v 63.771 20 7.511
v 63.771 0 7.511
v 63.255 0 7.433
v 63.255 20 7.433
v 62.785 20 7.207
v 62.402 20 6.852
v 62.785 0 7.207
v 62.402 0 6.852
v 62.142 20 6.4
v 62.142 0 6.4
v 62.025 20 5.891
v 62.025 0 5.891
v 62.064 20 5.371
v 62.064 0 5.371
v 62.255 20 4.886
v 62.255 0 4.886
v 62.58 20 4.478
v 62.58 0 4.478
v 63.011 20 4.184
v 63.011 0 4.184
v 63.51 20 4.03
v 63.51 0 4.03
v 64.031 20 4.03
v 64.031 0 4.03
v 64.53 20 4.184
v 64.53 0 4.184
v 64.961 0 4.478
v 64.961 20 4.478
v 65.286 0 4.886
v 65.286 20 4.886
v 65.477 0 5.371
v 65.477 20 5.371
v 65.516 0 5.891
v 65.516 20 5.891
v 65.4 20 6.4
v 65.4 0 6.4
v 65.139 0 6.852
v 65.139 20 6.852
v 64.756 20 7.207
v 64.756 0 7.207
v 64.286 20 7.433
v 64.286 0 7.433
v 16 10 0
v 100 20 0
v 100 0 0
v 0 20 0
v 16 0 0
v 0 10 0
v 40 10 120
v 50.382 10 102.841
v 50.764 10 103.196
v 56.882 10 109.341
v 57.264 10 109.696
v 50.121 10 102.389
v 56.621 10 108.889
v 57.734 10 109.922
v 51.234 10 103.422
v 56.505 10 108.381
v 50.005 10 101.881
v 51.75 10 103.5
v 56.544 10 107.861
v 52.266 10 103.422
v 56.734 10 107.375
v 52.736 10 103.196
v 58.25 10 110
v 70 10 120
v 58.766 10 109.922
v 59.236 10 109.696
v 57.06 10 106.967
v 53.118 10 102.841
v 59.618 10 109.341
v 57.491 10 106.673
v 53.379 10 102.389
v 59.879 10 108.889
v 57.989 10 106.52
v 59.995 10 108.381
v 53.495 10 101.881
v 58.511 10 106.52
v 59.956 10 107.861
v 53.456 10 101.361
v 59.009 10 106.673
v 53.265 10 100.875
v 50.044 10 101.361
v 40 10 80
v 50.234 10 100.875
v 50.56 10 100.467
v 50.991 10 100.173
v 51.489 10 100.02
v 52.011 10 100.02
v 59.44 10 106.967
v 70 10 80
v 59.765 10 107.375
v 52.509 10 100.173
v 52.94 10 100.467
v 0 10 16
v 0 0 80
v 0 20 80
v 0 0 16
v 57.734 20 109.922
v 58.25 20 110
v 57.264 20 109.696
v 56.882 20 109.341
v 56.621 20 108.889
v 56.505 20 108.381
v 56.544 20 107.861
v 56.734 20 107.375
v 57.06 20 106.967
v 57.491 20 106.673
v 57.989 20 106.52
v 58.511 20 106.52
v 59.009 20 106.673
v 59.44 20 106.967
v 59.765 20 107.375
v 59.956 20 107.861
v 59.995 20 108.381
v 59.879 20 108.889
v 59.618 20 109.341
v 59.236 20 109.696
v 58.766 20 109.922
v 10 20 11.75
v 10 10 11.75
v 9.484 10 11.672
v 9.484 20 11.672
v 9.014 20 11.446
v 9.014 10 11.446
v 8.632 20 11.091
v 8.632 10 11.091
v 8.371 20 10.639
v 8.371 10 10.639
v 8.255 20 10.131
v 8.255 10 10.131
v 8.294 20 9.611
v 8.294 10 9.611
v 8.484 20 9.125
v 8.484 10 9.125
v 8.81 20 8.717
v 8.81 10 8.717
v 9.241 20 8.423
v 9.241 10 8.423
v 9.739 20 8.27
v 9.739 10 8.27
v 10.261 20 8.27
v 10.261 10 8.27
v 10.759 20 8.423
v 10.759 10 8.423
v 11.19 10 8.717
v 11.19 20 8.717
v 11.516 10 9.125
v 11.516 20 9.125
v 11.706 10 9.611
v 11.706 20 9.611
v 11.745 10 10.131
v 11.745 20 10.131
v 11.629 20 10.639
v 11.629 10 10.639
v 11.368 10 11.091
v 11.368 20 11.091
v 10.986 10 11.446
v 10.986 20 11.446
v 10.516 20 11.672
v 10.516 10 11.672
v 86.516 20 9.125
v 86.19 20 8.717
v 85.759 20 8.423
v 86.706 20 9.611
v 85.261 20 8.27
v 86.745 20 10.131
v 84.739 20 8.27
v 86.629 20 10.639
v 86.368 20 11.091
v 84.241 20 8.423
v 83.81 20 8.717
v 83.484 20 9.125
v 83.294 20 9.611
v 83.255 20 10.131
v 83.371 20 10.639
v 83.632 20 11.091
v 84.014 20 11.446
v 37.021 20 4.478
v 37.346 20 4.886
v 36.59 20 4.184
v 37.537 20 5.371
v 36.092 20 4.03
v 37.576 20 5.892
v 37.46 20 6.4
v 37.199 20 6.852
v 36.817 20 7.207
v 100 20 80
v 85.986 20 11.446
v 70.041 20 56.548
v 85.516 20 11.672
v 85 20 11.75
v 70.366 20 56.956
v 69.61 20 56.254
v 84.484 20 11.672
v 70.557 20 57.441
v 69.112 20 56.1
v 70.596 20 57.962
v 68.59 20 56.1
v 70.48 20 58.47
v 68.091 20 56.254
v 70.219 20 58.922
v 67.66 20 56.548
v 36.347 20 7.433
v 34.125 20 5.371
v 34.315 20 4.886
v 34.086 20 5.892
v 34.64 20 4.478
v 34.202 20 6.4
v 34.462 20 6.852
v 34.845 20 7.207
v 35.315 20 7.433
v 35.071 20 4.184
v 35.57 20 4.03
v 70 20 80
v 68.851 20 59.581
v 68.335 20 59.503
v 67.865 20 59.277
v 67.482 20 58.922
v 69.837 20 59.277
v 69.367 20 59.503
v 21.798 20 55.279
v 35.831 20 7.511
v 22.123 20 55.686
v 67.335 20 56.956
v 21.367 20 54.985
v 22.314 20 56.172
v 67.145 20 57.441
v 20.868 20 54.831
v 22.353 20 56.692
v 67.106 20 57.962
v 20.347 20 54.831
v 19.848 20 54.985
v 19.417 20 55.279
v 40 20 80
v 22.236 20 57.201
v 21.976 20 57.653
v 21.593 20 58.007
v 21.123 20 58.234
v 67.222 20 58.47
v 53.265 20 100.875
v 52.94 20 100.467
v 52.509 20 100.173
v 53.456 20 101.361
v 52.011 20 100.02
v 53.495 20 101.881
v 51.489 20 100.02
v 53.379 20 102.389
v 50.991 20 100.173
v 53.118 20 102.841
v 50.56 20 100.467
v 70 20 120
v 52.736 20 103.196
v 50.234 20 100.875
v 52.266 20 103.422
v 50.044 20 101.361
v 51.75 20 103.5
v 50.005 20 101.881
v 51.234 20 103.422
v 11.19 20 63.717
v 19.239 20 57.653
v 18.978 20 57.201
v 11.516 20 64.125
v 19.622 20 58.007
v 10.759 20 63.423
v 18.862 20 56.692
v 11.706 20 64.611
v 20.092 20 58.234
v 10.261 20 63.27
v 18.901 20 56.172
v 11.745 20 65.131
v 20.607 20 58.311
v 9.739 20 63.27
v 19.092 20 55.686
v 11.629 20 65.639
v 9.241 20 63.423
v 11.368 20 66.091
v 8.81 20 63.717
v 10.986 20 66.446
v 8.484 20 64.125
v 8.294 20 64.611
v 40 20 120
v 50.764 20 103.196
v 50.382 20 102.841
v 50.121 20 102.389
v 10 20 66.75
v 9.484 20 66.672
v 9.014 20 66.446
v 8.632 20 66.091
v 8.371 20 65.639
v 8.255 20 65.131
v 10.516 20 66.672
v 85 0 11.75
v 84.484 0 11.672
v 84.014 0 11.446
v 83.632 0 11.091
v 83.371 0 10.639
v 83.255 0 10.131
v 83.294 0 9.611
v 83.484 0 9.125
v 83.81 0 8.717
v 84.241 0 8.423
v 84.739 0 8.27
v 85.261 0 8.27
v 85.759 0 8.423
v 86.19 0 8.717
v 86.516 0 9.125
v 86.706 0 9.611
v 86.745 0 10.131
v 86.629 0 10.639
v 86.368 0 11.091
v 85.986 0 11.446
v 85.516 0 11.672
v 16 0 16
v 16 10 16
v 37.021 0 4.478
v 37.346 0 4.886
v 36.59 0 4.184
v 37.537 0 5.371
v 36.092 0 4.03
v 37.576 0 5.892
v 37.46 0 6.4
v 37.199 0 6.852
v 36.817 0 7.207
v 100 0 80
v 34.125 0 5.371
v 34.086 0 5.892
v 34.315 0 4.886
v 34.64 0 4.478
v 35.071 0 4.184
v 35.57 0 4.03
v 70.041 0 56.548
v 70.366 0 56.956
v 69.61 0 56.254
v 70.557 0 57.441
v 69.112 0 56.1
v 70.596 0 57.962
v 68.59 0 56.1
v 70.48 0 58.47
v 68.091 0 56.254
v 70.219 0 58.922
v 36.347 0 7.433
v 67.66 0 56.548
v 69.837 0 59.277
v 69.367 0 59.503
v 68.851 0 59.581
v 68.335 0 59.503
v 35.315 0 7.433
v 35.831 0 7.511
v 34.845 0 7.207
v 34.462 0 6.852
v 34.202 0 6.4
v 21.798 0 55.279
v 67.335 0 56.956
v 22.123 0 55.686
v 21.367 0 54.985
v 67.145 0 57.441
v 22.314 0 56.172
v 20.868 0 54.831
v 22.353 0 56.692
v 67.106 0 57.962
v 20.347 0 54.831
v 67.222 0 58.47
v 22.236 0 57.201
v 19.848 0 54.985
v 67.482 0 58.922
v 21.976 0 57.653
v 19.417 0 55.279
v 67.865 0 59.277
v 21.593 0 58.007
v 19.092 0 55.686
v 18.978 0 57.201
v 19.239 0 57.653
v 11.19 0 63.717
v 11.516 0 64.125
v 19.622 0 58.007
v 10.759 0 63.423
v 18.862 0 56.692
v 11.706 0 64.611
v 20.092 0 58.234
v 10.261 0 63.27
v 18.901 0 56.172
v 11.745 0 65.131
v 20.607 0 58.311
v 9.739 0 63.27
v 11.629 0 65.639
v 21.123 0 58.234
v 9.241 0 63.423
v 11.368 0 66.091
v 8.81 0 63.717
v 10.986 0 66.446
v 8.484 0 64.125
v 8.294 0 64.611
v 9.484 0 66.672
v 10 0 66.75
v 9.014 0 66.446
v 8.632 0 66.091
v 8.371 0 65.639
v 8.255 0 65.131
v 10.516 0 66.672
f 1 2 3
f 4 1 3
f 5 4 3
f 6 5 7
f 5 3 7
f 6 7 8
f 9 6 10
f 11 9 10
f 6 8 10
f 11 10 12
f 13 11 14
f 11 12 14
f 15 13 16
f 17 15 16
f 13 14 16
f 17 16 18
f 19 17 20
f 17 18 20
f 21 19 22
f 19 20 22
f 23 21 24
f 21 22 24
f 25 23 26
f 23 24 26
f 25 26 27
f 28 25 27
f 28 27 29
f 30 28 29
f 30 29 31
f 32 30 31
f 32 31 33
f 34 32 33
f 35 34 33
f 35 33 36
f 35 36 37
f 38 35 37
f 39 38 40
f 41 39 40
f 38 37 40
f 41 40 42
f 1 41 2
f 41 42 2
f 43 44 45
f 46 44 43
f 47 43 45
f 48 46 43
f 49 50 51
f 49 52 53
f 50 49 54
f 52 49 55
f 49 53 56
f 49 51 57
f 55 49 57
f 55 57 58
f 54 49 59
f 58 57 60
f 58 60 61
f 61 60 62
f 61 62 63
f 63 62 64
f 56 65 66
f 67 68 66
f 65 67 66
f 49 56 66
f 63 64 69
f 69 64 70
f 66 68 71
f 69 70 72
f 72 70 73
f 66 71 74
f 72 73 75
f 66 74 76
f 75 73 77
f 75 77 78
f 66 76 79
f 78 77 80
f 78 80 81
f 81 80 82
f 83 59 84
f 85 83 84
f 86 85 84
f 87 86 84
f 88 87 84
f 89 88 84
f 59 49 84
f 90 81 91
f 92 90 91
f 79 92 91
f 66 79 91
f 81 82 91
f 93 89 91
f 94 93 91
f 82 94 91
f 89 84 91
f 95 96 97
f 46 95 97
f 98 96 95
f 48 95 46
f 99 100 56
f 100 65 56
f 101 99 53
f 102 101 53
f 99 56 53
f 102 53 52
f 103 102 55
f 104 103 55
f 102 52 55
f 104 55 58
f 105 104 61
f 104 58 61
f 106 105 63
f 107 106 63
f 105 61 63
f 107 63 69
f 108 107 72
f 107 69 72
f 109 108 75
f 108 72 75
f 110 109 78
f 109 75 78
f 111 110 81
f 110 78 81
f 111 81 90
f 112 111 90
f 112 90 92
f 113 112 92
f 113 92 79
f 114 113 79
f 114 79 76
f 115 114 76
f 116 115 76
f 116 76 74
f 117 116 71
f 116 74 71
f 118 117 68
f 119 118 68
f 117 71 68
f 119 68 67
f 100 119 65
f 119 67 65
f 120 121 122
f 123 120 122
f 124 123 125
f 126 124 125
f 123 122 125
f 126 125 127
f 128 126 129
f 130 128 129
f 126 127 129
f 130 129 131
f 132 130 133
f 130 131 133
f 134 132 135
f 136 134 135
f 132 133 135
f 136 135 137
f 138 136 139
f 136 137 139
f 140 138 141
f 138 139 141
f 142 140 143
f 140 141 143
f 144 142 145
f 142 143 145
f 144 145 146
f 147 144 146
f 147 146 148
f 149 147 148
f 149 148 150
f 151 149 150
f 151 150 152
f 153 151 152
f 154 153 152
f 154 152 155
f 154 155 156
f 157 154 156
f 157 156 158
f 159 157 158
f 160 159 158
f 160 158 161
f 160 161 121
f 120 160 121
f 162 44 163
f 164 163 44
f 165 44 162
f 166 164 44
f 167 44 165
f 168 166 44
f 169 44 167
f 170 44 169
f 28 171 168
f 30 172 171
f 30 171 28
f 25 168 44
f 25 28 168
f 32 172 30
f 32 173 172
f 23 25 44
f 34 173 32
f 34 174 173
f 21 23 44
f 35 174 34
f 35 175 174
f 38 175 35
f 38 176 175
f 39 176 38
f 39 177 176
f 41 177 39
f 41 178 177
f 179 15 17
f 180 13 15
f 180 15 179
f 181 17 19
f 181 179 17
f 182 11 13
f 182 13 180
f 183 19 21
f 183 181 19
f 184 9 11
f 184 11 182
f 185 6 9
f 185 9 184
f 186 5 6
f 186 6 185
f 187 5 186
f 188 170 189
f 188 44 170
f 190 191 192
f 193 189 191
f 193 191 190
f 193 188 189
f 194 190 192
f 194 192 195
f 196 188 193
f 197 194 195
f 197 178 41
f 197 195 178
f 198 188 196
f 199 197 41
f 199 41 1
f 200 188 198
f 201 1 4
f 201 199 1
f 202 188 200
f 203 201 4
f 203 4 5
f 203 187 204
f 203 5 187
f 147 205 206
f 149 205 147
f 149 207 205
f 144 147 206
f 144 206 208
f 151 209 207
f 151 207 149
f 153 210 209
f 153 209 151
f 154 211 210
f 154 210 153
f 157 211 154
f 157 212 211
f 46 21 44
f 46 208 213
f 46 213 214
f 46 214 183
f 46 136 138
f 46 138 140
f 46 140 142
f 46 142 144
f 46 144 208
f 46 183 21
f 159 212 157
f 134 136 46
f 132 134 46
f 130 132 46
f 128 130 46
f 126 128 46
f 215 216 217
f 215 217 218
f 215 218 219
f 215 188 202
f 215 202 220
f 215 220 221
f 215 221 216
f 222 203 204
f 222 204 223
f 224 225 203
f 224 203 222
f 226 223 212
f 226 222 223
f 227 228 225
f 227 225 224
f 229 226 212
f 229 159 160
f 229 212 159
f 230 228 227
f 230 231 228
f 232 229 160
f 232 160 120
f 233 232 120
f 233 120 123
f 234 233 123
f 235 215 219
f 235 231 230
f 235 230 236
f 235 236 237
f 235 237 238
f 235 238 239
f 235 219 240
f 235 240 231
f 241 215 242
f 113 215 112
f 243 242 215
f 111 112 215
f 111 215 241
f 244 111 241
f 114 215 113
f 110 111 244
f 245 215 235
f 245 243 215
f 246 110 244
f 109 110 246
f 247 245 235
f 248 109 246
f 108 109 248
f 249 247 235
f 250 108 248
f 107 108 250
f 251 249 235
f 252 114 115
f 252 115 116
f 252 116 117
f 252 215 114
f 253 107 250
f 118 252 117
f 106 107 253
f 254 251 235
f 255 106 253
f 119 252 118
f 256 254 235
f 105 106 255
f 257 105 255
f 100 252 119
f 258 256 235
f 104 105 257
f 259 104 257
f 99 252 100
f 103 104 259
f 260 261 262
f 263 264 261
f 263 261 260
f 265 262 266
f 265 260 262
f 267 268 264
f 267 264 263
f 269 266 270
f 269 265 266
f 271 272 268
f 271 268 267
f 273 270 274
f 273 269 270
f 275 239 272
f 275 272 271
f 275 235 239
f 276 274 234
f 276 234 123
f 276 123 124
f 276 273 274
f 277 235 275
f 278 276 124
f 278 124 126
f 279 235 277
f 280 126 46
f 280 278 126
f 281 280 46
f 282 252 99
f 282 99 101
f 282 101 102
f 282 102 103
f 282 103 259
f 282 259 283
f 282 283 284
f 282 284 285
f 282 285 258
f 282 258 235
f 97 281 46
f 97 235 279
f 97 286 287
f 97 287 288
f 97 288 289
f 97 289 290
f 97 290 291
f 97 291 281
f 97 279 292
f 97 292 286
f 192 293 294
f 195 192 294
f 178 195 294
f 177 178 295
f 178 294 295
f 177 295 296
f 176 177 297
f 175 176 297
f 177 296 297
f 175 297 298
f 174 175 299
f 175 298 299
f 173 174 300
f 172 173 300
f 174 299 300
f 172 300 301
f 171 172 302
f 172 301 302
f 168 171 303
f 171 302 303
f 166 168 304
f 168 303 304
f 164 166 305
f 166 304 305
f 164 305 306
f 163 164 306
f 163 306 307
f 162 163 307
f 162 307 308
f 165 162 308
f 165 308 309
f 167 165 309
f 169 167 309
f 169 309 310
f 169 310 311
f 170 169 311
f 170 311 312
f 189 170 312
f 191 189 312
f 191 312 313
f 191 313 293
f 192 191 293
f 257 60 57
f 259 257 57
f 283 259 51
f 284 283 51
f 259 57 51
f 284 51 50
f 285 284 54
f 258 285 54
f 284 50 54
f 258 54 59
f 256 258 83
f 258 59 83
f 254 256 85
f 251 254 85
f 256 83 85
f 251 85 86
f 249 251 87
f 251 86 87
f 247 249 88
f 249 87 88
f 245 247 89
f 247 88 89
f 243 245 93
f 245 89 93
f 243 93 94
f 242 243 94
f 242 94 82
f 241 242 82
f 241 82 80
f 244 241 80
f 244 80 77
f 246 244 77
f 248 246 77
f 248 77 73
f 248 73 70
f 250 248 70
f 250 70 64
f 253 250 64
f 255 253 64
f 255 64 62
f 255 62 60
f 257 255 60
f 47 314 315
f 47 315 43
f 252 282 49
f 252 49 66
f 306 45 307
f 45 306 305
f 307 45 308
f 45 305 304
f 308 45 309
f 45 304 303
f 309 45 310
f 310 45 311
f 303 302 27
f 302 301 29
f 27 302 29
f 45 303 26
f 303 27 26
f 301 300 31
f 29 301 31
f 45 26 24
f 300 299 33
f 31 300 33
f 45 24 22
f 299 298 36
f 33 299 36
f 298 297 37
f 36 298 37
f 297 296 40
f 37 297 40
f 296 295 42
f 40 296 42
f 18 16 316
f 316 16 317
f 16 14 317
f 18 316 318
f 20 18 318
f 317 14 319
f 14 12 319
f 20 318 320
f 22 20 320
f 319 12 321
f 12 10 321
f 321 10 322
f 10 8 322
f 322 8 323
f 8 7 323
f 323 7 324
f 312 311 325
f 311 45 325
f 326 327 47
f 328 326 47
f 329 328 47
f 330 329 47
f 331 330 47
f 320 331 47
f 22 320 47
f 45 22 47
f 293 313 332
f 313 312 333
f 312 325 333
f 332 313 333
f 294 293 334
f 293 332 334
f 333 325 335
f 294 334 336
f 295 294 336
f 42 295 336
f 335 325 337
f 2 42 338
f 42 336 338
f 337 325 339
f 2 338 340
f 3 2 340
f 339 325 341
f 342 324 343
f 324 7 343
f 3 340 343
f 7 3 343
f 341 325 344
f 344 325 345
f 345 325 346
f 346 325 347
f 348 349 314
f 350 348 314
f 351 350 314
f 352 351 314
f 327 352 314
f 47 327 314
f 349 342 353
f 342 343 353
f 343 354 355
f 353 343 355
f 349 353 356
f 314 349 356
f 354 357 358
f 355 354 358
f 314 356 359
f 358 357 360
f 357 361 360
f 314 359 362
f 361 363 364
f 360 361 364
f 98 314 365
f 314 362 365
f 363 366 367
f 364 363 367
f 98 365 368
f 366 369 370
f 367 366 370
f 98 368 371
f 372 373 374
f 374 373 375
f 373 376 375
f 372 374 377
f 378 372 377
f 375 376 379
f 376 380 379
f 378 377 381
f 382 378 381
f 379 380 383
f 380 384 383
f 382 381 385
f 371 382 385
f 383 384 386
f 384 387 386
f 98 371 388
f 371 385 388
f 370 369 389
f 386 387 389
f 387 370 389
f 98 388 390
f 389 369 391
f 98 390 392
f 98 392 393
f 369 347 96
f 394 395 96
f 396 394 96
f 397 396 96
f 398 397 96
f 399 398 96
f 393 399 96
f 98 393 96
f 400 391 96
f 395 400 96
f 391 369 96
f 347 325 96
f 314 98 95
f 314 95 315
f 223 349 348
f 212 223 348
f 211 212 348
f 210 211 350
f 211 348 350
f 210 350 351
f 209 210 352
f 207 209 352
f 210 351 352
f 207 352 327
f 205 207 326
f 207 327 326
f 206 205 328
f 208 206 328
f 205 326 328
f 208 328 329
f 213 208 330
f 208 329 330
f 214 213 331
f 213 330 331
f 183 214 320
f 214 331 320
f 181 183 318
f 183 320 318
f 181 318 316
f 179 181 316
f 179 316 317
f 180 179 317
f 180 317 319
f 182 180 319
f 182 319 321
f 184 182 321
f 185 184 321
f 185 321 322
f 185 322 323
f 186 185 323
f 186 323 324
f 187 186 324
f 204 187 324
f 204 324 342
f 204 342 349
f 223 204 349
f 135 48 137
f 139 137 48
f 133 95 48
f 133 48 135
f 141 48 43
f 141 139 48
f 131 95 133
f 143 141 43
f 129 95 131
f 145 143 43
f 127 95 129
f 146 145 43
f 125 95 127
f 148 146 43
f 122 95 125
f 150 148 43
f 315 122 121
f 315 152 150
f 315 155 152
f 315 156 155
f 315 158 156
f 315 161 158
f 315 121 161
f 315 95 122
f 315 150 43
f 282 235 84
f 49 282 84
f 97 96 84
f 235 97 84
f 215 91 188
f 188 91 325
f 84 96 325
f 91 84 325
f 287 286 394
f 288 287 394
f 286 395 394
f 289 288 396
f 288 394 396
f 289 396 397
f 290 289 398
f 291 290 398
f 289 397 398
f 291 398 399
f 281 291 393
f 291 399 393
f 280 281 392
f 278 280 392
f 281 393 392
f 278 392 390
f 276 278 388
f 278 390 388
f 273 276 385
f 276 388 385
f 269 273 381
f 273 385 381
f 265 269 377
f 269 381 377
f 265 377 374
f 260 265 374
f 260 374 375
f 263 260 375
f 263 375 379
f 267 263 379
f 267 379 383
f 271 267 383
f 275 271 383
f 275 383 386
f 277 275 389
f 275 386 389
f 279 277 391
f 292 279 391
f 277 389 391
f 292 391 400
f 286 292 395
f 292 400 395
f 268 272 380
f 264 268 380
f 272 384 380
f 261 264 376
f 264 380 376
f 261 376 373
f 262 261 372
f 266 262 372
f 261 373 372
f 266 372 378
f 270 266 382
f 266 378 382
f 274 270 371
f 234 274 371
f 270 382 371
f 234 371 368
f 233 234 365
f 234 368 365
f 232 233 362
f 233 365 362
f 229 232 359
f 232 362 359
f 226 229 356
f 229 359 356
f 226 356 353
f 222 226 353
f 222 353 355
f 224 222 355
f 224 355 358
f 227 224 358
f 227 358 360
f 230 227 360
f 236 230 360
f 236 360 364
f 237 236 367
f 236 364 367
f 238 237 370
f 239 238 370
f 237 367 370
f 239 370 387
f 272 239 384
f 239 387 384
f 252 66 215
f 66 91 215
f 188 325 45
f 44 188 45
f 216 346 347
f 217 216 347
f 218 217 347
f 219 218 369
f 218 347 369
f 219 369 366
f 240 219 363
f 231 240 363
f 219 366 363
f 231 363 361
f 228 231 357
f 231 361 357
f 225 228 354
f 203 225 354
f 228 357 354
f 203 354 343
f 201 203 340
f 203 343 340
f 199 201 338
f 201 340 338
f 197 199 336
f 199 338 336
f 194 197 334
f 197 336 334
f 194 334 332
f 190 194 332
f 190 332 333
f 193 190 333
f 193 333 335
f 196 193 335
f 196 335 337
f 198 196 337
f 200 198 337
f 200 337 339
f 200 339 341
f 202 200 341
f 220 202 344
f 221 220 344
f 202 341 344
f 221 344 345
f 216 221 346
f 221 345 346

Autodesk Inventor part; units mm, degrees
ref_plane "YZ Plane" through (0, 0, 0) normal (1, 0, 0) x (0, 1, 0)
ref_plane "XZ Plane" through (0, 0, 0) normal (0, 1, 0) x (-1, 0, 0)
ref_plane "XY Plane" through (0, 0, 0) normal (0, 0, 1) x (1, 0, 0)
sketch "Boceto1" plane through (0, 0, 0) normal (0, 1, 0) x (-1, 0, 0)
  line L0 (100, 80) -> (-100, 80)
  line L1 (-100, 80) -> (-100, -80)
  line L2 (-100, -80) -> (100, -80)
  line L3 (100, -80) -> (100, 80)
  line L4 (100, 80) -> (-100, -80) construction
  line L5 (-100, 80) -> (100, -80) construction
  point P0 (0, 0)
  dimension "d0" = 200
  dimension "d1" = 160
extrude "Extrusión1" add sketch "Boceto1" along normal blind 20
sketch "Boceto2" plane through (0, 20, 0) normal (0, 1, 0) x (1, 0, 0)
  line L0 (-100, 80) -> (-100, -80) projected
  line L1 (-100, 80) -> (-70, 80)
  line L2 (-70, 80) -> (-70, 40)
  line L3 (-70, 40) -> (-100, 40)
  line L4 (-100, 40) -> (-100, 80)
  line L5 (100, 80) -> (-100, 80) projected
  line L6 (0, 80) -> (0, 40)
  line L7 (100, 80) -> (70, 80)
  line L8 (70, 80) -> (70, 40)
  line L9 (70, 40) -> (100, 40)
  line L10 (100, 40) -> (100, 80)
  point P0 (0, 0)
  dimension "d4" = 30
  dimension "d5" = 40
extrude "Extrusión2" cut sketch "Boceto2" against normal blind 10
sketch "Boceto3" plane through (0, 20, 0) normal (0, 1, 0) x (1, 0, 0)
  line L0 (-70, 80) -> (-70, 40) projected
  line L1 (-70, 80.0001) -> (-70, 40)
  line L2 (-70, 40) -> (-100, 40) projected
  line L3 (-100, 40) -> (-100, 80.0001)
  line L4 (-100, 40) -> (-70, 40)
  line L5 (-70, 40) -> (-70, 80)
  line L6 (-70, 80) -> (-100, 80)
  line L7 (-100, 80) -> (-100, 40)
  circle A0 centre (-88.25, 58.25) radius 1.75
  circle A1 centre (-81.75, 51.75) radius 1.75
  line L8 (100, 80) -> (-100, 80) projected
  line L9 (0, 80) -> (0, 56.5)
  circle A2 centre (88.25, 58.25) radius 1.75
  circle A3 centre (81.75, 51.75) radius 1.75
  point P0 (0, 0)
  point P1 (-64.3507, 80)
  point P2 (-74.3507, 0)
  point P3 (-85, 80)
  dimension "d23" = 21.75
  dimension "d24" = 11.75
  dimension "d26" = 11.75
hole "Agujero1" at (-81.75, 20, -51.75) at (-88.25, 20, -58.25) at (81.75, 20, -51.75) at (88.25, 20, -58.25) direction (0, -1, 0) diameter 3.5 end through all
sketch "Boceto4" plane through (-100, 0, 80) normal (0, 0, 1) x (1, 0, 0)
  line L0 (30, 20) -> (60, 20)
  line L1 (60, 20) -> (60, 10)
  line L2 (60, 10) -> (30, 10)
  line L3 (30, 10) -> (30, 20)
  line L4 (0, 0) -> (0, 20) projected
  line L5 (100, 0) -> (100, 10)
  line L6 (170, 20) -> (140, 20)
  line L7 (140, 20) -> (140, 10)
  line L8 (140, 10) -> (170, 10)
  line L9 (170, 10) -> (170, 20)
  dimension "d34" = 30
  dimension "d35" = 10
  dimension "d36" = 30
extrude "Extrusión3" add sketch "Boceto4" along normal blind 40
sketch "Boceto5" plane through (0, 20, 0) normal (0, 1, 0) x (1, 0, 0)
  line L0 (59.9999, -50) -> (69.9999, -50)
  line L1 (49.9999, -101.75) -> (49.9999, -79.9497)
  line L2 (59.9999, -108.25) -> (59.9999, -50)
  line L3 (40, -80) -> (69.9999, -80)
  line L4 (49.9999, -79.9497) -> (40, -80)
  circle A0 centre (51.7499, -101.75) radius 1.75
  circle A1 centre (58.2499, -108.25) radius 1.75
  line L5 (69.9999, -80) -> (69.9999, -120)
  line L6 (40, -120) -> (40, -80)
  line L7 (69.9999, -120) -> (40, -120)
  line L8 (0, -50) -> (0, -71.75)
  line L9 (-40, -120) -> (-40, -80)
  line L10 (-49.9999, -101.75) -> (-49.9999, -79.9497)
  circle A2 centre (-51.7499, -101.75) radius 1.75
  circle A3 centre (-58.2499, -108.25) radius 1.75
  line L11 (-40, -80) -> (-69.9999, -80)
  line L12 (-69.9999, -120) -> (-40, -120)
  line L13 (-69.9999, -80) -> (-69.9999, -120)
  line L14 (-59.9999, -108.25) -> (-59.9999, -50)
  line L15 (-40, -120) -> (-69.9999, -120)
  line L16 (-69.9999, -80) -> (-69.9999, -120)
  line L17 (-40, -120) -> (-70, -120) projected
  line L18 (-40, -80) -> (-40, -120) projected
  line L19 (-59.9999, -110) -> (-49.9999, -110)
  line L20 (-49.9999, -110) -> (-49.9999, -100)
  line L21 (-49.9999, -100) -> (-59.9999, -100)
  line L22 (-59.9999, -100) -> (-59.9999, -110)
  line L23 (-100, 40) -> (-100, -80) projected
  point P0 (0, 0)
  point P1 (-56.75, -68.25)
  point P2 (-63.25, -61.75)
  point P3 (63.25, -61.75)
  point P4 (56.75, -68.25)
  dimension "d45" = 3.5
  dimension "d46" = 3.5
  dimension "d39" = 10
  dimension "d40" = 10
  dimension "d41" = 40
  dimension "d42" = 0
  dimension "d43" = 6.5
  dimension "d44" = 6.5
  dimension "d47" = 11.7499
  dimension "d48" = 11.75
  dimension "d49" = 0
  dimension "d50" = 11.75
  dimension "d51" = 0
  dimension "d97" = 40.0001
hole "Agujero2" at (-58.2499, 20, 108.25) at (-51.7499, 20, 101.75) at (51.7499, 20, 101.75) at (58.2499, 20, 108.25) direction (0, -1, 0) diameter 3.5 end through all
sketch "Boceto6" plane through (0, 20, 0) normal (0, 1, 0) x (1, 0, 0)
  circle A0 centre (-60.569, -13.1067) radius 10
  circle A1 centre (-29.569, -59.1067) radius 3.5
  line L0 (-60.569, -13.1067) -> (-39.0083, -13.1067)
  circle A2 centre (-29.569, 25.8933) radius 3.5
  circle A3 centre (-88.569, 25.8933) radius 3.5
  circle A4 centre (-88.569, -59.1067) radius 3.5
  line L1 (70.4544, -63.0517) -> (18.4544, -63.0517)
  line L2 (18.4544, -63.0517) -> (18.4544, 6.9483)
  line L3 (18.4544, 6.9483) -> (70.4544, 6.9483)
  line L4 (70.4544, 6.9483) -> (70.4544, -63.0517)
  line L5 (70.4544, 6.9483) -> (48.4544, 6.9483)
  line L6 (48.4544, 6.9483) -> (48.4544, 48.9483)
  line L7 (48.4544, 48.9483) -> (70.4544, 48.9483)
  line L8 (70.4544, 48.9483) -> (70.4544, 6.9483)
  line L9 (77.2288, -8.158) -> (77.2281, -5.6604)
  circle A5 centre (63.7706, -5.7606) radius 1.75
  line L10 (70.7641, -24.1464) -> (70.7641, 22.2796)
  circle A6 centre (35.8307, -5.7609) radius 1.75
  line L11 (25.1581, -13.2381) -> (25.1581, -10.7404)
  circle A7 centre (68.8507, -57.8309) radius 1.75
  line L12 (26.4277, 35.0051) -> (26.4277, 37.5029)
  circle A8 centre (20.6074, -56.5614) radius 1.75
  line L13 (18.6941, -55.9176) -> (70.7641, -55.9176)
  line L14 (18.6941, -55.9176) -> (18.6941, -7.6743)
  line L15 (44.7291, -55.9176) -> (44.7291, -31.7959)
  line L16 (63.7706, -28.0517) -> (26.4277, -28.0517)
  line L17 (44.7291, -23.5247) -> (44.7291, -31.7959)
  point P0 (0, 0)
  point P1 (-60.569, -16.6067)
  point P2 (45.425, 12.8886)
  point P3 (44.7291, -28.0517)
  dimension "d59" = 7
  dimension "d60" = 7
  dimension "d61" = 7
  dimension "d62" = 39
  dimension "d63" = 46
  dimension "d64" = 59
  dimension "d65" = 46
  dimension "d66" = 39
  dimension "d67" = 59
  dimension "d68" = 52
  dimension "d69" = 70
  dimension "d70" = 22
  dimension "d71" = 42
  dimension "d72" = 3.5
  dimension "d73" = 3.5
  dimension "d74" = 3.5
  dimension "d75" = 3.5
  dimension "d142" = 17.3763
  dimension "d143" = 12.7092
  dimension "d144" = 6.6837
  dimension "d145" = 12.7089
  dimension "d146" = 5.2208
  dimension "d147" = 1.6037
  dimension "d148" = 2.1531
  dimension "d149" = 6.4903
hole "Agujero3" at (68.8507, 20, 57.8309) at (20.6074, 20, 56.5614) at (63.7706, 20, 5.7606) at (35.8307, 20, 5.7609) direction (0, -1, 0) diameter 3.5 end through all
sketch "Boceto7" plane through (0, 20, 0) normal (0, 1, 0) x (1, 0, 0)
  circle A0 centre (-60.569, -13.1067) radius 10
  circle A1 centre (-29.569, -59.1067) radius 3.5
  line L0 (-60.569, -13.1067) -> (-39.0083, -13.1067)
  circle A2 centre (-29.569, 25.8933) radius 3.5
  circle A3 centre (-88.569, 25.8933) radius 3.5
  circle A4 centre (-88.569, -59.1067) radius 3.5
  point P0 (0, 0)
  point P1 (-60.569, -16.6067)
  dimension "d83" = 7
  dimension "d84" = 7
  dimension "d85" = 7
  dimension "d86" = 39
  dimension "d87" = 46
  dimension "d88" = 59
  dimension "d89" = 46
  dimension "d90" = 39
  dimension "d91" = 59
extrude "Extrusión4" cut sketch "Boceto7" against normal blind 20
ref_plane "Plano de trabajo1" through (0, 0, -80) normal (-1, 0, 0) x (0, 0, 1)
ref_plane "Plano de trabajo2" through (100, 0, 0) normal (0, 0, -1) x (-1, 0, 0)
sketch "Boceto8" plane through (0, 20, 0) normal (0, 1, 0) x (1, 0, 0)
  line L0 (80, -15) -> (90, -15)
  circle A0 centre (85, -10) radius 1.75
  line L1 (85, 10) -> (85, -10)
  line L2 (90, -15) -> (90, 15)
  circle A1 centre (85, 10) radius 1.75
  line L3 (80, 15) -> (80, -15)
  line L4 (90, 15) -> (80, -15) construction
  line L5 (80, 15) -> (90, -15) construction
  line L6 (90, 15) -> (80, 15)
  line L7 (100, -80) -> (100, 40) projected
  line L8 (0, 0) -> (20, -20)
  line L9 (0, 0) -> (28.2843, 0) construction
  line L10 (15, -60) -> (15, -70)
  circle A2 centre (10, -65) radius 1.75
  line L11 (-10, -65) -> (10, -65)
  line L12 (15, -70) -> (-15, -70)
  circle A3 centre (-10, -65) radius 1.75
  line L13 (-15, -60) -> (15, -60)
  line L14 (-15, -70) -> (15, -60) construction
  line L15 (-15, -60) -> (15, -70) construction
  line L16 (-15, -70) -> (-15, -60)
  line L17 (0, 0) -> (18.6615, 18.6615)
  line L18 (0, 0) -> (26.3913, 0) construction
  line L19 (-15, 60) -> (-15, 70)
  circle A4 centre (-10, 65) radius 1.75
  line L20 (10, 65) -> (-10, 65)
  line L21 (-15, 70) -> (15, 70)
  circle A5 centre (10, 65) radius 1.75
  line L22 (15, 60) -> (-15, 60)
  line L23 (15, 70) -> (-15, 60) construction
  line L24 (15, 60) -> (-15, 70) construction
  line L25 (15, 70) -> (15, 60)
  line L26 (70, 80) -> (-70, 80) projected
  line L27 (-40, -80) -> (40, -80) projected
  point P0 (86.9608, 0)
  point P1 (86.9608, 0)
  point P2 (85, 15)
  point P3 (0, -69.1269)
  point P4 (0, -69.1269)
  point P5 (-15, -67.1661)
  point P6 (0, 69.7066)
  point P7 (0, 69.7066)
  point P8 (15, 67.7458)
  point P9 (-15, 65)
  point P10 (15, -65)
  dimension "d98" = 10
  dimension "d99" = 30
  dimension "d100" = 10
  dimension "d101" = 5
  dimension "d102" = 5
  dimension "d103" = 5
  dimension "d104" = 5
  dimension "d105" = 45
  dimension "d106" = 45
  dimension "d107" = 10
  dimension "d108" = 10
  dimension "d109" = 30
  dimension "d110" = 5
  dimension "d111" = 5
  dimension "d112" = 5
  dimension "d113" = 5
  dimension "d114" = 10
  dimension "d115" = 30
  dimension "d116" = 5
  dimension "d117" = 5
  dimension "d118" = 5
  dimension "d119" = 5
  dimension "d120" = 10
hole "Agujero4" at (-10, 20, -65) at (10, 20, -65) at (85, 20, -10) at (85, 20, 10) at (10, 20, 65) at (-10, 20, 65) direction (0, -1, 0) diameter 3.5 end through all
sketch "Boceto9" plane through (0, 20, 0) normal (0, 1, 0) x (1, 0, 0)
  circle A0 centre (10, -10) radius 1.75
  line L0 (6.803, 0) -> (14.6069, 0)
  line L1 (0, 0) -> (0, -4.8284)
  line L2 (0, 0) -> (20.0354, 0)
  circle A1 centre (10, 10) radius 1.75
  line L3 (0, 0) -> (0, 4.8284)
  circle A2 centre (-10, 10) radius 1.75
  circle A3 centre (-10, -10) radius 1.75
  dimension "d128" = 3.5
  dimension "d129" = 10
  dimension "d130" = 10
hole "Agujero5" at (-10, 20, 10) at (-10, 20, -10) at (10, 20, -10) at (10, 20, 10) direction (0, -1, 0) diameter 3.5 end through all
sketch "Boceto10" plane through (0, 0, 0) normal (0, -1, 0) x (1, 0, 0)
  line L0 (-16, 16) -> (16, 16)
  line L1 (16, 16) -> (16, -16)
  line L2 (16, -16) -> (-16, -16)
  line L3 (-16, -16) -> (-16, 16)
  line L4 (-16, 16) -> (16, -16) construction
  line L5 (16, 16) -> (-16, -16) construction
  point P0 (0, 0)
  point P1 (0, 0)
  dimension "d138" = 32
  dimension "d139" = 32
extrude "Extrusión5" cut sketch "Boceto10" against normal blind 10
split "Dividir1" plane through (100, 0, 0) removes the side toward (0, 0, -1)
split "Dividir2" plane through (0, 0, -80) removes the side toward (-1, 0, 0)
properties part number "base_mid_4"
